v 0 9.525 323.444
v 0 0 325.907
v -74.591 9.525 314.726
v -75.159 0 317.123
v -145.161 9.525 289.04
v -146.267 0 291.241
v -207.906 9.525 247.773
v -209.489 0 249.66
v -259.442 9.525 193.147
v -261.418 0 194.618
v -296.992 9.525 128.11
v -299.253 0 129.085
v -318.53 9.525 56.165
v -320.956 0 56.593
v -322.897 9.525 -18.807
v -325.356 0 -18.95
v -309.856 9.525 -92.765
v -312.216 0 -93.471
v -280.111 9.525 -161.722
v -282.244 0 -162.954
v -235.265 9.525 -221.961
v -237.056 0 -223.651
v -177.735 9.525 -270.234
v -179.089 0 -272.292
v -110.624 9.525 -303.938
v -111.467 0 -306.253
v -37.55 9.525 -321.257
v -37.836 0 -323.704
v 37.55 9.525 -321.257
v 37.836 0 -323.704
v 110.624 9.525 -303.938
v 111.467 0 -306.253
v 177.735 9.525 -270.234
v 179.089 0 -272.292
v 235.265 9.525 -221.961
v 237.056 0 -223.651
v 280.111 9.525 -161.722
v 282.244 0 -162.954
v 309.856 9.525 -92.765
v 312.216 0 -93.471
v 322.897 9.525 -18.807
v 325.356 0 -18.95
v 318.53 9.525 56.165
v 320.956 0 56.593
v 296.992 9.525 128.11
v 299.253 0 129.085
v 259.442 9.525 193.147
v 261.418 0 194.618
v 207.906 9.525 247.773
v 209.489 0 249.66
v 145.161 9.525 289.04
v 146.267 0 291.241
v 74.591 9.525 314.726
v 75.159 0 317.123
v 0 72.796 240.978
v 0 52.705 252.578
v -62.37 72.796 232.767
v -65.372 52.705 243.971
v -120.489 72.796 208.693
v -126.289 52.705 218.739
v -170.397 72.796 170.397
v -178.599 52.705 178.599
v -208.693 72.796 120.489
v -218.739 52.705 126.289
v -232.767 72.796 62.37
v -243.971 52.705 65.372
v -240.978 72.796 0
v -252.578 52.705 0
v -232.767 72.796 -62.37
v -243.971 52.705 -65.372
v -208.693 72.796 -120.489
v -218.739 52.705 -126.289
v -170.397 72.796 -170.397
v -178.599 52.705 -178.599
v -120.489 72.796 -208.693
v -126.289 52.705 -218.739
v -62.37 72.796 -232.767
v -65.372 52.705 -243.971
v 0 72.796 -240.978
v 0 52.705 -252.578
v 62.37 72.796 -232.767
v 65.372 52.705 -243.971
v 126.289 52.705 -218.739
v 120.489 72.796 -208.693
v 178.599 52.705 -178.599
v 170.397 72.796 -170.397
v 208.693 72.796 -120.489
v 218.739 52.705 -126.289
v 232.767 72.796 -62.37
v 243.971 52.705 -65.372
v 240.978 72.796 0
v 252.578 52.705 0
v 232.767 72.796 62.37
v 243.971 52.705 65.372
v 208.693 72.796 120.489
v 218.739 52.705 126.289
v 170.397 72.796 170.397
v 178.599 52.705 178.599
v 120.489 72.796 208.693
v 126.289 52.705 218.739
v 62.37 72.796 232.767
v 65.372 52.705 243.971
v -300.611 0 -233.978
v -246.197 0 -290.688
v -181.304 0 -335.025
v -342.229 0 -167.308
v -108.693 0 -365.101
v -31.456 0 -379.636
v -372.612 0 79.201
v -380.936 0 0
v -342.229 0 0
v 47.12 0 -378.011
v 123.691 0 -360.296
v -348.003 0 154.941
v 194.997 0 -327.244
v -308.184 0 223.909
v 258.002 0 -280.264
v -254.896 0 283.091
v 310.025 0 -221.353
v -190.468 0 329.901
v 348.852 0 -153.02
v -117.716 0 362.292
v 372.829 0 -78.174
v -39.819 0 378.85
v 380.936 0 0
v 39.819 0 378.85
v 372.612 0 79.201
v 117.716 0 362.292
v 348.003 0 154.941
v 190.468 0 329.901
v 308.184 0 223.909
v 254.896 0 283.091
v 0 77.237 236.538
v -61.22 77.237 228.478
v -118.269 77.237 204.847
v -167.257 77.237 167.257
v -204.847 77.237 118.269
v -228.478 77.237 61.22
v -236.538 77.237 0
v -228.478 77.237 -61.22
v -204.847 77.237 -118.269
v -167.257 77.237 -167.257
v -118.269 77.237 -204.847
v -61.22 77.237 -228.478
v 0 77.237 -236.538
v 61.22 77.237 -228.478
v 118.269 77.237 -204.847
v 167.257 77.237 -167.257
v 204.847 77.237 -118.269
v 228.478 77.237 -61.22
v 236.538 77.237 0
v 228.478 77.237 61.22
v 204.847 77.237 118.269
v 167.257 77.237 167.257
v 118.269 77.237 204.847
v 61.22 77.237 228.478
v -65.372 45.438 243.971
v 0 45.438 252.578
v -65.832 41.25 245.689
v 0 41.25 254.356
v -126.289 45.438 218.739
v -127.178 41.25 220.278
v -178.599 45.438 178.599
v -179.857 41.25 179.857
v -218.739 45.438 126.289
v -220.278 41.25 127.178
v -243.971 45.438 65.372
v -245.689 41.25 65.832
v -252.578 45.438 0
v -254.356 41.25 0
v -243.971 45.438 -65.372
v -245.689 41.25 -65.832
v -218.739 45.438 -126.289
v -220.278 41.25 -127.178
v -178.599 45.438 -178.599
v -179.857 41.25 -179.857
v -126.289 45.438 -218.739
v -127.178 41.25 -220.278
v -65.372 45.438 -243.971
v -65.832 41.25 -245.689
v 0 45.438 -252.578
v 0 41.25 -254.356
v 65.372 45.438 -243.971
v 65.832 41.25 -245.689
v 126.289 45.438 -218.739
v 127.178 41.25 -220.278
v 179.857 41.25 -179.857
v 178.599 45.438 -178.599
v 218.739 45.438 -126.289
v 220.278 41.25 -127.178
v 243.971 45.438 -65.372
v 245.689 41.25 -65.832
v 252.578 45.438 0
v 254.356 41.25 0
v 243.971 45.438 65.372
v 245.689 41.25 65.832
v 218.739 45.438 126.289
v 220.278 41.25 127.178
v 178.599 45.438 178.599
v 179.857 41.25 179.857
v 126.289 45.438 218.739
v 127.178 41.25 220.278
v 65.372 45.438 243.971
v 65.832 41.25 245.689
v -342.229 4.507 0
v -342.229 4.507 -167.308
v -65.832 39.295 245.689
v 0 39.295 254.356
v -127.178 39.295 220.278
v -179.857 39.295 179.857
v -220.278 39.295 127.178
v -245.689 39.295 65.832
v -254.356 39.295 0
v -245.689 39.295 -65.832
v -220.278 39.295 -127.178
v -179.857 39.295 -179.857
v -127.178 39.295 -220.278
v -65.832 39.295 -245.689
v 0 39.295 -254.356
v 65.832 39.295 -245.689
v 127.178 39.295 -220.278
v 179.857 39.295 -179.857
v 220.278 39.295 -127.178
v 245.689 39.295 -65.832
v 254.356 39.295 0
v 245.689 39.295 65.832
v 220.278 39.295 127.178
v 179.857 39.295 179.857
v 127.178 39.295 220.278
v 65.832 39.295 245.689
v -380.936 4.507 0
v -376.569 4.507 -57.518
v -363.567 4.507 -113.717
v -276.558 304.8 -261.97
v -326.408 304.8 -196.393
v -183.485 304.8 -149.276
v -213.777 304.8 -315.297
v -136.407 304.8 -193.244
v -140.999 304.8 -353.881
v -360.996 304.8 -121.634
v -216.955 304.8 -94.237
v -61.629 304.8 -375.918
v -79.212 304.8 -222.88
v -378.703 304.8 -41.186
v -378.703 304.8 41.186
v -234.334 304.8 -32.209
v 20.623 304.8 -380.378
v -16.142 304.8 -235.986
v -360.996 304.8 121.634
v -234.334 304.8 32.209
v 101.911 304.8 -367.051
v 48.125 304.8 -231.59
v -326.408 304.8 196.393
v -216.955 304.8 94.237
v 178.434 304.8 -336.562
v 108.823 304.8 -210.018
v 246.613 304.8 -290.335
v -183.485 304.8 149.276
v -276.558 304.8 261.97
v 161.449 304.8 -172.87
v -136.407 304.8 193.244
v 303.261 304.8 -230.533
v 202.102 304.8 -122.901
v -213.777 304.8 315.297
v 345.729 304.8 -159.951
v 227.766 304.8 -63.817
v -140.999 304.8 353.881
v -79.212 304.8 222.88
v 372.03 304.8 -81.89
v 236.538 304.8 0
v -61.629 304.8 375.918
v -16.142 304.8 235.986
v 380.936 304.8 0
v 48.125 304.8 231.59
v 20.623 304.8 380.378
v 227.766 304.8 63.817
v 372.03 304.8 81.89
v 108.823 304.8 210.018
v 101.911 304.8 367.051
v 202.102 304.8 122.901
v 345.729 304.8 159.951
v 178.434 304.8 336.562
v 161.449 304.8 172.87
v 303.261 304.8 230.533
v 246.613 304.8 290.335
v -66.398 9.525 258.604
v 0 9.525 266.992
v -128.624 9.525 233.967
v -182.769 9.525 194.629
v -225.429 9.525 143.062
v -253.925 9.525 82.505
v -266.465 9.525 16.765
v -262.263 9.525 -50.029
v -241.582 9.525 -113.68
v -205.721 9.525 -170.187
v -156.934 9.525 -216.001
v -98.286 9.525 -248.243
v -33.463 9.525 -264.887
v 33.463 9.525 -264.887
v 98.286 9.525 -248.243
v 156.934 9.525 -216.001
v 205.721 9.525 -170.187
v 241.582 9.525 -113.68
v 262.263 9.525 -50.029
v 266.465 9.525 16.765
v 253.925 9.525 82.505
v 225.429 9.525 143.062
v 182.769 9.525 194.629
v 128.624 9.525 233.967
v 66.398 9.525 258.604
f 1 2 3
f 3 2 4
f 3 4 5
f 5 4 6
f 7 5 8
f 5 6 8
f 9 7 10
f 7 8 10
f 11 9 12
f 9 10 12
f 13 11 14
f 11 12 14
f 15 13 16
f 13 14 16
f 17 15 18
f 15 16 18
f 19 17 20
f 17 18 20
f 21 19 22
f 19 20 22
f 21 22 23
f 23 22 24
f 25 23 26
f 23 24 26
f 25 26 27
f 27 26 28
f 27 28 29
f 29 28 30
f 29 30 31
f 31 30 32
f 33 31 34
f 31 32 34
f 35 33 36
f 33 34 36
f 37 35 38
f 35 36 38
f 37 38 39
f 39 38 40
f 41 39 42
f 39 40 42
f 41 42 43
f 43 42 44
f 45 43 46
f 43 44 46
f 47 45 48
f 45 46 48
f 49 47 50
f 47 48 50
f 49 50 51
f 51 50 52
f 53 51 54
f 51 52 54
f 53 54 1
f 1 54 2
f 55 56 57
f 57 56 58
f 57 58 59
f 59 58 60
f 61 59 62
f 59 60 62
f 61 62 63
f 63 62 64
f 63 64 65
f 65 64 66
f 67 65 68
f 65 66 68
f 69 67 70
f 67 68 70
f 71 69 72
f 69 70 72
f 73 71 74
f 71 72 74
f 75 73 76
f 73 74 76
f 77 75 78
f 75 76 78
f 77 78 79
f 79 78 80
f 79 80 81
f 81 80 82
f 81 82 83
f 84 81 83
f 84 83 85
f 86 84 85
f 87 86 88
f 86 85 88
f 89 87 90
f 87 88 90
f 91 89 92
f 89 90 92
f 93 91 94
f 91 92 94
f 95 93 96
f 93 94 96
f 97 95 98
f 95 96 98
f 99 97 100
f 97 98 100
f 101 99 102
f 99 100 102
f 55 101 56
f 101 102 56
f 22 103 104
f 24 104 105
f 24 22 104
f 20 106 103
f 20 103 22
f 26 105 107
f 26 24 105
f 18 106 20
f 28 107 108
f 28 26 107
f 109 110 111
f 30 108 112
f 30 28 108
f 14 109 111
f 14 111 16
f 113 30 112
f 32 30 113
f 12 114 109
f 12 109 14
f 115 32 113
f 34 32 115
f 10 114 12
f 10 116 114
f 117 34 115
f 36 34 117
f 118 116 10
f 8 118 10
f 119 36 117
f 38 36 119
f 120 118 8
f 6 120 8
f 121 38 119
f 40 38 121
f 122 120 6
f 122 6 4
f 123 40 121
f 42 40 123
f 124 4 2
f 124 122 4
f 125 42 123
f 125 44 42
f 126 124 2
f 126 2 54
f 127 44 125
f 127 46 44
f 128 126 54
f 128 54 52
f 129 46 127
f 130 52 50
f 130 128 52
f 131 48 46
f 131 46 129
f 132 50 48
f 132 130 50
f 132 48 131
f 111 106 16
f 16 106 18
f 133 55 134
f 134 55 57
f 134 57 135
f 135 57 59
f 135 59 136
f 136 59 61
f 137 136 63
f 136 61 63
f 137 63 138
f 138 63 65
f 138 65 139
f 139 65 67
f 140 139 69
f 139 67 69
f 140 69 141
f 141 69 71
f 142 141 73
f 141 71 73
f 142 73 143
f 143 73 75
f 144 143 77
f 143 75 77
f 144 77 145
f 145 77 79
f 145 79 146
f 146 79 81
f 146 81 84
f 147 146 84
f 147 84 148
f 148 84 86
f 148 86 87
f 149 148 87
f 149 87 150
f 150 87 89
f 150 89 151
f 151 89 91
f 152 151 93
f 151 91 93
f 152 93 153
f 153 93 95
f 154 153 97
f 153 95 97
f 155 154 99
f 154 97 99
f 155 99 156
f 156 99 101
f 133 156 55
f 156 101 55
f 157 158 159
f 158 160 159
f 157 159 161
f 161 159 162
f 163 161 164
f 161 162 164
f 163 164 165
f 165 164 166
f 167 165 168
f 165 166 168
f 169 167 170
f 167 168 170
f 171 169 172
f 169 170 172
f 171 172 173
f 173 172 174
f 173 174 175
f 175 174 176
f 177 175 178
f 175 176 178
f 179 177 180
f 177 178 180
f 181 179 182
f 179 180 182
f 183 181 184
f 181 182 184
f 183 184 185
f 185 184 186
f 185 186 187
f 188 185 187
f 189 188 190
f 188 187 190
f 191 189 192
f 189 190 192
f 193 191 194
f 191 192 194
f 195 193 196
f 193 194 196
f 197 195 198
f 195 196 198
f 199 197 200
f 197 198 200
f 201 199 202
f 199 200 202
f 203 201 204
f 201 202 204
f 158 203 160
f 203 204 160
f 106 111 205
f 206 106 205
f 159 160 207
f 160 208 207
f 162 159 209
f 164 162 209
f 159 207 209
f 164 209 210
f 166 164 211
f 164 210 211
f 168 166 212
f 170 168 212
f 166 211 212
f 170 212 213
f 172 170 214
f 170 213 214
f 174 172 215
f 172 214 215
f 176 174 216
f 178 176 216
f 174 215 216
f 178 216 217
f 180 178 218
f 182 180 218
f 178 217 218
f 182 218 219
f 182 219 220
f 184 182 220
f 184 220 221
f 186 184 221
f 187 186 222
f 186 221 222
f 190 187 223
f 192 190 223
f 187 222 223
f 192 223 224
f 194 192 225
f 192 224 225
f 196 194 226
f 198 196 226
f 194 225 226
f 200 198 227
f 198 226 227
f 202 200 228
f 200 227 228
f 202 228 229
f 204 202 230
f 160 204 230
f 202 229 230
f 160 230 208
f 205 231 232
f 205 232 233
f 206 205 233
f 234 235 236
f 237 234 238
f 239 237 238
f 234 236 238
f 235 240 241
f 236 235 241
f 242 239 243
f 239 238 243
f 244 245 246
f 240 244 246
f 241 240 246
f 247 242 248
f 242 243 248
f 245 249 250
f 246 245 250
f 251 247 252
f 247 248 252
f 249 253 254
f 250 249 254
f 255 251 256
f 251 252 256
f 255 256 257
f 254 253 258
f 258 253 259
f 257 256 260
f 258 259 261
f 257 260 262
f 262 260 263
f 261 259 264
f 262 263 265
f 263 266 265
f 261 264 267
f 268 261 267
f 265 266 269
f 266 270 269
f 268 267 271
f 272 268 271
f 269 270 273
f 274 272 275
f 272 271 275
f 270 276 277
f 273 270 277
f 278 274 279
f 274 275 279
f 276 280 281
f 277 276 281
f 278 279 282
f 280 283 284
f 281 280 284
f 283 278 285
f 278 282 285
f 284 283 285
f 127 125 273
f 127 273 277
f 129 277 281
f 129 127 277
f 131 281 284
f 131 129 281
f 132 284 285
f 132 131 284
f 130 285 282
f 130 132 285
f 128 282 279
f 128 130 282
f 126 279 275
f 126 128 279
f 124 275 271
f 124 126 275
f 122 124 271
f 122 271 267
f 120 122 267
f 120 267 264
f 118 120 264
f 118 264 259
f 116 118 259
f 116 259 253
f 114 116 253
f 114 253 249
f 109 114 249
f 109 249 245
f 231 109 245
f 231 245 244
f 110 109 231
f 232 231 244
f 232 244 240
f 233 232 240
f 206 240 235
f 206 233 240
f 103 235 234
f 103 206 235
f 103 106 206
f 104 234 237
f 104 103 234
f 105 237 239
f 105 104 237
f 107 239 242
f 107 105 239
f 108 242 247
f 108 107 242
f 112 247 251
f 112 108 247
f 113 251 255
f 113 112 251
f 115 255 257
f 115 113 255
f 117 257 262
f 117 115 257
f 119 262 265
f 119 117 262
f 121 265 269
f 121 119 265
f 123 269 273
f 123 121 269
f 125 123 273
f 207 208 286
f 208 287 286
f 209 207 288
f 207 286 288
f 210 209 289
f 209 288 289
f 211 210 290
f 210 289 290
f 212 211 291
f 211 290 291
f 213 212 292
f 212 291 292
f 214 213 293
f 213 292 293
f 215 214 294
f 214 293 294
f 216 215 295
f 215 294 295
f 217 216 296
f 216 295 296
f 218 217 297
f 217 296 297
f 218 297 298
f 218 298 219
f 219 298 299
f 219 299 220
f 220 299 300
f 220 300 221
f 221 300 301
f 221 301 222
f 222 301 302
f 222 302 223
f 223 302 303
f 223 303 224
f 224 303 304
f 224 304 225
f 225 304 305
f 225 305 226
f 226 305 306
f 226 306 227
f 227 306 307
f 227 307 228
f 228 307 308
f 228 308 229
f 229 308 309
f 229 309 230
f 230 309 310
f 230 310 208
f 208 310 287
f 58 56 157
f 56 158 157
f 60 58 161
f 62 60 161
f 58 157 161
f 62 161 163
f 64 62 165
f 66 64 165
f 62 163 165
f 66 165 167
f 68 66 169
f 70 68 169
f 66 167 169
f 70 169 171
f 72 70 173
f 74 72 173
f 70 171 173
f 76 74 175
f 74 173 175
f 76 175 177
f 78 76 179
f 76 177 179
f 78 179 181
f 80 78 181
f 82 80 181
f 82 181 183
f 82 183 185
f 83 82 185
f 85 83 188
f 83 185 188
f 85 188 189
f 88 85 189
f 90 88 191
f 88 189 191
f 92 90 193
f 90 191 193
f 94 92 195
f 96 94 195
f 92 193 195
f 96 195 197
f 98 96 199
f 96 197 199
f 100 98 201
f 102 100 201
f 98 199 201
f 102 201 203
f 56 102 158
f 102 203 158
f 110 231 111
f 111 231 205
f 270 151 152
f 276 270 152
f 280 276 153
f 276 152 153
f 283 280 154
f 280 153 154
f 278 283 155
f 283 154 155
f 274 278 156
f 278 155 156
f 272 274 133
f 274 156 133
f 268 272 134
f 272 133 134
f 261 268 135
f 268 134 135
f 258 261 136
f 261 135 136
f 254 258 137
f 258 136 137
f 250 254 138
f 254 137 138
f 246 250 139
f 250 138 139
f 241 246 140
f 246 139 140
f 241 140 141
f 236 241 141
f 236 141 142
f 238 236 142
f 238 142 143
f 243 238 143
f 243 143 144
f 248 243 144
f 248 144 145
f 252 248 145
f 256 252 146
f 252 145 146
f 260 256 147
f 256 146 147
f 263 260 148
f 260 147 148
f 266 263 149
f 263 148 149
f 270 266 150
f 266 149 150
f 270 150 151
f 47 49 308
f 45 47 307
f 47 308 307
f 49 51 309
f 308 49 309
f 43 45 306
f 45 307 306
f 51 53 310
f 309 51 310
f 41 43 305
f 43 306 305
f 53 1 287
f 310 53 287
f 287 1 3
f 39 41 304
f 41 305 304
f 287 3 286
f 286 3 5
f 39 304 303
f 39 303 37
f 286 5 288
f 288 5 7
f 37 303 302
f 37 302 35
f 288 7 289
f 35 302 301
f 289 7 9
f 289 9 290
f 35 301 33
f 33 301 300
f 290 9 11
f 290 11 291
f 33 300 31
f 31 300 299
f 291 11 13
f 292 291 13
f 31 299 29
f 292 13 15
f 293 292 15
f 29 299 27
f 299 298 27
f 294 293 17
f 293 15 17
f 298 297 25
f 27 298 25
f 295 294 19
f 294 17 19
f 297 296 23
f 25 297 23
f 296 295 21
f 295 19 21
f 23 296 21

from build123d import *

# Parameters (mm, degrees)
F0_R     = 380.9365
F0_R_2   = 236.5375
F1_DEPTH = 304.8
F6_W     = 53.241849
F6_H     = 17.892758
F7_DEPTH = 231.14


with BuildPart() as f1:
    # F0 (on Front) → F1 (new body)
    with BuildSketch(Plane.XZ):
        Circle(F0_R)
        Circle(F0_R_2, mode=Mode.SUBTRACT)
    extrude(amount=-F1_DEPTH)

    # F2 (on Right) → F3 (revolve, cut)
    with BuildSketch(Plane.YZ):
        Polygon((-0.674657, 0), (0, 0), (9.525, 0), (9.525, 323.444068), (0, 325.9074), (-38.13795, 325.9074), align=None)
    revolve(axis=Axis((0, -111.905819, 0), (0, -1, 0)), mode=Mode.SUBTRACT)

    # F4 (on Right) → F5 (revolve, cut)
    with BuildSketch(Plane.YZ):
        Polygon((39.294728, 254.3556), (9.525, 266.9921), (-83.954796, 266.9921), (-48.076838, 187.997639), (83.789648, 229.984577), (72.7964, 240.977825), (52.705, 252.5776), (45.438306, 252.5776), (41.2496, 254.3556), align=None)
    revolve(axis=Axis((0, 0, 0), (0, -1, 0)), mode=Mode.SUBTRACT)

    # F6 (on Top) → F7 (cut)
    with BuildSketch(Plane.XY):
        with Locations((-368.849694, -4.439522)):
            Rectangle(F6_W, F6_H)
    extrude(amount=-F7_DEPTH, mode=Mode.SUBTRACT)


solid = f1.part
